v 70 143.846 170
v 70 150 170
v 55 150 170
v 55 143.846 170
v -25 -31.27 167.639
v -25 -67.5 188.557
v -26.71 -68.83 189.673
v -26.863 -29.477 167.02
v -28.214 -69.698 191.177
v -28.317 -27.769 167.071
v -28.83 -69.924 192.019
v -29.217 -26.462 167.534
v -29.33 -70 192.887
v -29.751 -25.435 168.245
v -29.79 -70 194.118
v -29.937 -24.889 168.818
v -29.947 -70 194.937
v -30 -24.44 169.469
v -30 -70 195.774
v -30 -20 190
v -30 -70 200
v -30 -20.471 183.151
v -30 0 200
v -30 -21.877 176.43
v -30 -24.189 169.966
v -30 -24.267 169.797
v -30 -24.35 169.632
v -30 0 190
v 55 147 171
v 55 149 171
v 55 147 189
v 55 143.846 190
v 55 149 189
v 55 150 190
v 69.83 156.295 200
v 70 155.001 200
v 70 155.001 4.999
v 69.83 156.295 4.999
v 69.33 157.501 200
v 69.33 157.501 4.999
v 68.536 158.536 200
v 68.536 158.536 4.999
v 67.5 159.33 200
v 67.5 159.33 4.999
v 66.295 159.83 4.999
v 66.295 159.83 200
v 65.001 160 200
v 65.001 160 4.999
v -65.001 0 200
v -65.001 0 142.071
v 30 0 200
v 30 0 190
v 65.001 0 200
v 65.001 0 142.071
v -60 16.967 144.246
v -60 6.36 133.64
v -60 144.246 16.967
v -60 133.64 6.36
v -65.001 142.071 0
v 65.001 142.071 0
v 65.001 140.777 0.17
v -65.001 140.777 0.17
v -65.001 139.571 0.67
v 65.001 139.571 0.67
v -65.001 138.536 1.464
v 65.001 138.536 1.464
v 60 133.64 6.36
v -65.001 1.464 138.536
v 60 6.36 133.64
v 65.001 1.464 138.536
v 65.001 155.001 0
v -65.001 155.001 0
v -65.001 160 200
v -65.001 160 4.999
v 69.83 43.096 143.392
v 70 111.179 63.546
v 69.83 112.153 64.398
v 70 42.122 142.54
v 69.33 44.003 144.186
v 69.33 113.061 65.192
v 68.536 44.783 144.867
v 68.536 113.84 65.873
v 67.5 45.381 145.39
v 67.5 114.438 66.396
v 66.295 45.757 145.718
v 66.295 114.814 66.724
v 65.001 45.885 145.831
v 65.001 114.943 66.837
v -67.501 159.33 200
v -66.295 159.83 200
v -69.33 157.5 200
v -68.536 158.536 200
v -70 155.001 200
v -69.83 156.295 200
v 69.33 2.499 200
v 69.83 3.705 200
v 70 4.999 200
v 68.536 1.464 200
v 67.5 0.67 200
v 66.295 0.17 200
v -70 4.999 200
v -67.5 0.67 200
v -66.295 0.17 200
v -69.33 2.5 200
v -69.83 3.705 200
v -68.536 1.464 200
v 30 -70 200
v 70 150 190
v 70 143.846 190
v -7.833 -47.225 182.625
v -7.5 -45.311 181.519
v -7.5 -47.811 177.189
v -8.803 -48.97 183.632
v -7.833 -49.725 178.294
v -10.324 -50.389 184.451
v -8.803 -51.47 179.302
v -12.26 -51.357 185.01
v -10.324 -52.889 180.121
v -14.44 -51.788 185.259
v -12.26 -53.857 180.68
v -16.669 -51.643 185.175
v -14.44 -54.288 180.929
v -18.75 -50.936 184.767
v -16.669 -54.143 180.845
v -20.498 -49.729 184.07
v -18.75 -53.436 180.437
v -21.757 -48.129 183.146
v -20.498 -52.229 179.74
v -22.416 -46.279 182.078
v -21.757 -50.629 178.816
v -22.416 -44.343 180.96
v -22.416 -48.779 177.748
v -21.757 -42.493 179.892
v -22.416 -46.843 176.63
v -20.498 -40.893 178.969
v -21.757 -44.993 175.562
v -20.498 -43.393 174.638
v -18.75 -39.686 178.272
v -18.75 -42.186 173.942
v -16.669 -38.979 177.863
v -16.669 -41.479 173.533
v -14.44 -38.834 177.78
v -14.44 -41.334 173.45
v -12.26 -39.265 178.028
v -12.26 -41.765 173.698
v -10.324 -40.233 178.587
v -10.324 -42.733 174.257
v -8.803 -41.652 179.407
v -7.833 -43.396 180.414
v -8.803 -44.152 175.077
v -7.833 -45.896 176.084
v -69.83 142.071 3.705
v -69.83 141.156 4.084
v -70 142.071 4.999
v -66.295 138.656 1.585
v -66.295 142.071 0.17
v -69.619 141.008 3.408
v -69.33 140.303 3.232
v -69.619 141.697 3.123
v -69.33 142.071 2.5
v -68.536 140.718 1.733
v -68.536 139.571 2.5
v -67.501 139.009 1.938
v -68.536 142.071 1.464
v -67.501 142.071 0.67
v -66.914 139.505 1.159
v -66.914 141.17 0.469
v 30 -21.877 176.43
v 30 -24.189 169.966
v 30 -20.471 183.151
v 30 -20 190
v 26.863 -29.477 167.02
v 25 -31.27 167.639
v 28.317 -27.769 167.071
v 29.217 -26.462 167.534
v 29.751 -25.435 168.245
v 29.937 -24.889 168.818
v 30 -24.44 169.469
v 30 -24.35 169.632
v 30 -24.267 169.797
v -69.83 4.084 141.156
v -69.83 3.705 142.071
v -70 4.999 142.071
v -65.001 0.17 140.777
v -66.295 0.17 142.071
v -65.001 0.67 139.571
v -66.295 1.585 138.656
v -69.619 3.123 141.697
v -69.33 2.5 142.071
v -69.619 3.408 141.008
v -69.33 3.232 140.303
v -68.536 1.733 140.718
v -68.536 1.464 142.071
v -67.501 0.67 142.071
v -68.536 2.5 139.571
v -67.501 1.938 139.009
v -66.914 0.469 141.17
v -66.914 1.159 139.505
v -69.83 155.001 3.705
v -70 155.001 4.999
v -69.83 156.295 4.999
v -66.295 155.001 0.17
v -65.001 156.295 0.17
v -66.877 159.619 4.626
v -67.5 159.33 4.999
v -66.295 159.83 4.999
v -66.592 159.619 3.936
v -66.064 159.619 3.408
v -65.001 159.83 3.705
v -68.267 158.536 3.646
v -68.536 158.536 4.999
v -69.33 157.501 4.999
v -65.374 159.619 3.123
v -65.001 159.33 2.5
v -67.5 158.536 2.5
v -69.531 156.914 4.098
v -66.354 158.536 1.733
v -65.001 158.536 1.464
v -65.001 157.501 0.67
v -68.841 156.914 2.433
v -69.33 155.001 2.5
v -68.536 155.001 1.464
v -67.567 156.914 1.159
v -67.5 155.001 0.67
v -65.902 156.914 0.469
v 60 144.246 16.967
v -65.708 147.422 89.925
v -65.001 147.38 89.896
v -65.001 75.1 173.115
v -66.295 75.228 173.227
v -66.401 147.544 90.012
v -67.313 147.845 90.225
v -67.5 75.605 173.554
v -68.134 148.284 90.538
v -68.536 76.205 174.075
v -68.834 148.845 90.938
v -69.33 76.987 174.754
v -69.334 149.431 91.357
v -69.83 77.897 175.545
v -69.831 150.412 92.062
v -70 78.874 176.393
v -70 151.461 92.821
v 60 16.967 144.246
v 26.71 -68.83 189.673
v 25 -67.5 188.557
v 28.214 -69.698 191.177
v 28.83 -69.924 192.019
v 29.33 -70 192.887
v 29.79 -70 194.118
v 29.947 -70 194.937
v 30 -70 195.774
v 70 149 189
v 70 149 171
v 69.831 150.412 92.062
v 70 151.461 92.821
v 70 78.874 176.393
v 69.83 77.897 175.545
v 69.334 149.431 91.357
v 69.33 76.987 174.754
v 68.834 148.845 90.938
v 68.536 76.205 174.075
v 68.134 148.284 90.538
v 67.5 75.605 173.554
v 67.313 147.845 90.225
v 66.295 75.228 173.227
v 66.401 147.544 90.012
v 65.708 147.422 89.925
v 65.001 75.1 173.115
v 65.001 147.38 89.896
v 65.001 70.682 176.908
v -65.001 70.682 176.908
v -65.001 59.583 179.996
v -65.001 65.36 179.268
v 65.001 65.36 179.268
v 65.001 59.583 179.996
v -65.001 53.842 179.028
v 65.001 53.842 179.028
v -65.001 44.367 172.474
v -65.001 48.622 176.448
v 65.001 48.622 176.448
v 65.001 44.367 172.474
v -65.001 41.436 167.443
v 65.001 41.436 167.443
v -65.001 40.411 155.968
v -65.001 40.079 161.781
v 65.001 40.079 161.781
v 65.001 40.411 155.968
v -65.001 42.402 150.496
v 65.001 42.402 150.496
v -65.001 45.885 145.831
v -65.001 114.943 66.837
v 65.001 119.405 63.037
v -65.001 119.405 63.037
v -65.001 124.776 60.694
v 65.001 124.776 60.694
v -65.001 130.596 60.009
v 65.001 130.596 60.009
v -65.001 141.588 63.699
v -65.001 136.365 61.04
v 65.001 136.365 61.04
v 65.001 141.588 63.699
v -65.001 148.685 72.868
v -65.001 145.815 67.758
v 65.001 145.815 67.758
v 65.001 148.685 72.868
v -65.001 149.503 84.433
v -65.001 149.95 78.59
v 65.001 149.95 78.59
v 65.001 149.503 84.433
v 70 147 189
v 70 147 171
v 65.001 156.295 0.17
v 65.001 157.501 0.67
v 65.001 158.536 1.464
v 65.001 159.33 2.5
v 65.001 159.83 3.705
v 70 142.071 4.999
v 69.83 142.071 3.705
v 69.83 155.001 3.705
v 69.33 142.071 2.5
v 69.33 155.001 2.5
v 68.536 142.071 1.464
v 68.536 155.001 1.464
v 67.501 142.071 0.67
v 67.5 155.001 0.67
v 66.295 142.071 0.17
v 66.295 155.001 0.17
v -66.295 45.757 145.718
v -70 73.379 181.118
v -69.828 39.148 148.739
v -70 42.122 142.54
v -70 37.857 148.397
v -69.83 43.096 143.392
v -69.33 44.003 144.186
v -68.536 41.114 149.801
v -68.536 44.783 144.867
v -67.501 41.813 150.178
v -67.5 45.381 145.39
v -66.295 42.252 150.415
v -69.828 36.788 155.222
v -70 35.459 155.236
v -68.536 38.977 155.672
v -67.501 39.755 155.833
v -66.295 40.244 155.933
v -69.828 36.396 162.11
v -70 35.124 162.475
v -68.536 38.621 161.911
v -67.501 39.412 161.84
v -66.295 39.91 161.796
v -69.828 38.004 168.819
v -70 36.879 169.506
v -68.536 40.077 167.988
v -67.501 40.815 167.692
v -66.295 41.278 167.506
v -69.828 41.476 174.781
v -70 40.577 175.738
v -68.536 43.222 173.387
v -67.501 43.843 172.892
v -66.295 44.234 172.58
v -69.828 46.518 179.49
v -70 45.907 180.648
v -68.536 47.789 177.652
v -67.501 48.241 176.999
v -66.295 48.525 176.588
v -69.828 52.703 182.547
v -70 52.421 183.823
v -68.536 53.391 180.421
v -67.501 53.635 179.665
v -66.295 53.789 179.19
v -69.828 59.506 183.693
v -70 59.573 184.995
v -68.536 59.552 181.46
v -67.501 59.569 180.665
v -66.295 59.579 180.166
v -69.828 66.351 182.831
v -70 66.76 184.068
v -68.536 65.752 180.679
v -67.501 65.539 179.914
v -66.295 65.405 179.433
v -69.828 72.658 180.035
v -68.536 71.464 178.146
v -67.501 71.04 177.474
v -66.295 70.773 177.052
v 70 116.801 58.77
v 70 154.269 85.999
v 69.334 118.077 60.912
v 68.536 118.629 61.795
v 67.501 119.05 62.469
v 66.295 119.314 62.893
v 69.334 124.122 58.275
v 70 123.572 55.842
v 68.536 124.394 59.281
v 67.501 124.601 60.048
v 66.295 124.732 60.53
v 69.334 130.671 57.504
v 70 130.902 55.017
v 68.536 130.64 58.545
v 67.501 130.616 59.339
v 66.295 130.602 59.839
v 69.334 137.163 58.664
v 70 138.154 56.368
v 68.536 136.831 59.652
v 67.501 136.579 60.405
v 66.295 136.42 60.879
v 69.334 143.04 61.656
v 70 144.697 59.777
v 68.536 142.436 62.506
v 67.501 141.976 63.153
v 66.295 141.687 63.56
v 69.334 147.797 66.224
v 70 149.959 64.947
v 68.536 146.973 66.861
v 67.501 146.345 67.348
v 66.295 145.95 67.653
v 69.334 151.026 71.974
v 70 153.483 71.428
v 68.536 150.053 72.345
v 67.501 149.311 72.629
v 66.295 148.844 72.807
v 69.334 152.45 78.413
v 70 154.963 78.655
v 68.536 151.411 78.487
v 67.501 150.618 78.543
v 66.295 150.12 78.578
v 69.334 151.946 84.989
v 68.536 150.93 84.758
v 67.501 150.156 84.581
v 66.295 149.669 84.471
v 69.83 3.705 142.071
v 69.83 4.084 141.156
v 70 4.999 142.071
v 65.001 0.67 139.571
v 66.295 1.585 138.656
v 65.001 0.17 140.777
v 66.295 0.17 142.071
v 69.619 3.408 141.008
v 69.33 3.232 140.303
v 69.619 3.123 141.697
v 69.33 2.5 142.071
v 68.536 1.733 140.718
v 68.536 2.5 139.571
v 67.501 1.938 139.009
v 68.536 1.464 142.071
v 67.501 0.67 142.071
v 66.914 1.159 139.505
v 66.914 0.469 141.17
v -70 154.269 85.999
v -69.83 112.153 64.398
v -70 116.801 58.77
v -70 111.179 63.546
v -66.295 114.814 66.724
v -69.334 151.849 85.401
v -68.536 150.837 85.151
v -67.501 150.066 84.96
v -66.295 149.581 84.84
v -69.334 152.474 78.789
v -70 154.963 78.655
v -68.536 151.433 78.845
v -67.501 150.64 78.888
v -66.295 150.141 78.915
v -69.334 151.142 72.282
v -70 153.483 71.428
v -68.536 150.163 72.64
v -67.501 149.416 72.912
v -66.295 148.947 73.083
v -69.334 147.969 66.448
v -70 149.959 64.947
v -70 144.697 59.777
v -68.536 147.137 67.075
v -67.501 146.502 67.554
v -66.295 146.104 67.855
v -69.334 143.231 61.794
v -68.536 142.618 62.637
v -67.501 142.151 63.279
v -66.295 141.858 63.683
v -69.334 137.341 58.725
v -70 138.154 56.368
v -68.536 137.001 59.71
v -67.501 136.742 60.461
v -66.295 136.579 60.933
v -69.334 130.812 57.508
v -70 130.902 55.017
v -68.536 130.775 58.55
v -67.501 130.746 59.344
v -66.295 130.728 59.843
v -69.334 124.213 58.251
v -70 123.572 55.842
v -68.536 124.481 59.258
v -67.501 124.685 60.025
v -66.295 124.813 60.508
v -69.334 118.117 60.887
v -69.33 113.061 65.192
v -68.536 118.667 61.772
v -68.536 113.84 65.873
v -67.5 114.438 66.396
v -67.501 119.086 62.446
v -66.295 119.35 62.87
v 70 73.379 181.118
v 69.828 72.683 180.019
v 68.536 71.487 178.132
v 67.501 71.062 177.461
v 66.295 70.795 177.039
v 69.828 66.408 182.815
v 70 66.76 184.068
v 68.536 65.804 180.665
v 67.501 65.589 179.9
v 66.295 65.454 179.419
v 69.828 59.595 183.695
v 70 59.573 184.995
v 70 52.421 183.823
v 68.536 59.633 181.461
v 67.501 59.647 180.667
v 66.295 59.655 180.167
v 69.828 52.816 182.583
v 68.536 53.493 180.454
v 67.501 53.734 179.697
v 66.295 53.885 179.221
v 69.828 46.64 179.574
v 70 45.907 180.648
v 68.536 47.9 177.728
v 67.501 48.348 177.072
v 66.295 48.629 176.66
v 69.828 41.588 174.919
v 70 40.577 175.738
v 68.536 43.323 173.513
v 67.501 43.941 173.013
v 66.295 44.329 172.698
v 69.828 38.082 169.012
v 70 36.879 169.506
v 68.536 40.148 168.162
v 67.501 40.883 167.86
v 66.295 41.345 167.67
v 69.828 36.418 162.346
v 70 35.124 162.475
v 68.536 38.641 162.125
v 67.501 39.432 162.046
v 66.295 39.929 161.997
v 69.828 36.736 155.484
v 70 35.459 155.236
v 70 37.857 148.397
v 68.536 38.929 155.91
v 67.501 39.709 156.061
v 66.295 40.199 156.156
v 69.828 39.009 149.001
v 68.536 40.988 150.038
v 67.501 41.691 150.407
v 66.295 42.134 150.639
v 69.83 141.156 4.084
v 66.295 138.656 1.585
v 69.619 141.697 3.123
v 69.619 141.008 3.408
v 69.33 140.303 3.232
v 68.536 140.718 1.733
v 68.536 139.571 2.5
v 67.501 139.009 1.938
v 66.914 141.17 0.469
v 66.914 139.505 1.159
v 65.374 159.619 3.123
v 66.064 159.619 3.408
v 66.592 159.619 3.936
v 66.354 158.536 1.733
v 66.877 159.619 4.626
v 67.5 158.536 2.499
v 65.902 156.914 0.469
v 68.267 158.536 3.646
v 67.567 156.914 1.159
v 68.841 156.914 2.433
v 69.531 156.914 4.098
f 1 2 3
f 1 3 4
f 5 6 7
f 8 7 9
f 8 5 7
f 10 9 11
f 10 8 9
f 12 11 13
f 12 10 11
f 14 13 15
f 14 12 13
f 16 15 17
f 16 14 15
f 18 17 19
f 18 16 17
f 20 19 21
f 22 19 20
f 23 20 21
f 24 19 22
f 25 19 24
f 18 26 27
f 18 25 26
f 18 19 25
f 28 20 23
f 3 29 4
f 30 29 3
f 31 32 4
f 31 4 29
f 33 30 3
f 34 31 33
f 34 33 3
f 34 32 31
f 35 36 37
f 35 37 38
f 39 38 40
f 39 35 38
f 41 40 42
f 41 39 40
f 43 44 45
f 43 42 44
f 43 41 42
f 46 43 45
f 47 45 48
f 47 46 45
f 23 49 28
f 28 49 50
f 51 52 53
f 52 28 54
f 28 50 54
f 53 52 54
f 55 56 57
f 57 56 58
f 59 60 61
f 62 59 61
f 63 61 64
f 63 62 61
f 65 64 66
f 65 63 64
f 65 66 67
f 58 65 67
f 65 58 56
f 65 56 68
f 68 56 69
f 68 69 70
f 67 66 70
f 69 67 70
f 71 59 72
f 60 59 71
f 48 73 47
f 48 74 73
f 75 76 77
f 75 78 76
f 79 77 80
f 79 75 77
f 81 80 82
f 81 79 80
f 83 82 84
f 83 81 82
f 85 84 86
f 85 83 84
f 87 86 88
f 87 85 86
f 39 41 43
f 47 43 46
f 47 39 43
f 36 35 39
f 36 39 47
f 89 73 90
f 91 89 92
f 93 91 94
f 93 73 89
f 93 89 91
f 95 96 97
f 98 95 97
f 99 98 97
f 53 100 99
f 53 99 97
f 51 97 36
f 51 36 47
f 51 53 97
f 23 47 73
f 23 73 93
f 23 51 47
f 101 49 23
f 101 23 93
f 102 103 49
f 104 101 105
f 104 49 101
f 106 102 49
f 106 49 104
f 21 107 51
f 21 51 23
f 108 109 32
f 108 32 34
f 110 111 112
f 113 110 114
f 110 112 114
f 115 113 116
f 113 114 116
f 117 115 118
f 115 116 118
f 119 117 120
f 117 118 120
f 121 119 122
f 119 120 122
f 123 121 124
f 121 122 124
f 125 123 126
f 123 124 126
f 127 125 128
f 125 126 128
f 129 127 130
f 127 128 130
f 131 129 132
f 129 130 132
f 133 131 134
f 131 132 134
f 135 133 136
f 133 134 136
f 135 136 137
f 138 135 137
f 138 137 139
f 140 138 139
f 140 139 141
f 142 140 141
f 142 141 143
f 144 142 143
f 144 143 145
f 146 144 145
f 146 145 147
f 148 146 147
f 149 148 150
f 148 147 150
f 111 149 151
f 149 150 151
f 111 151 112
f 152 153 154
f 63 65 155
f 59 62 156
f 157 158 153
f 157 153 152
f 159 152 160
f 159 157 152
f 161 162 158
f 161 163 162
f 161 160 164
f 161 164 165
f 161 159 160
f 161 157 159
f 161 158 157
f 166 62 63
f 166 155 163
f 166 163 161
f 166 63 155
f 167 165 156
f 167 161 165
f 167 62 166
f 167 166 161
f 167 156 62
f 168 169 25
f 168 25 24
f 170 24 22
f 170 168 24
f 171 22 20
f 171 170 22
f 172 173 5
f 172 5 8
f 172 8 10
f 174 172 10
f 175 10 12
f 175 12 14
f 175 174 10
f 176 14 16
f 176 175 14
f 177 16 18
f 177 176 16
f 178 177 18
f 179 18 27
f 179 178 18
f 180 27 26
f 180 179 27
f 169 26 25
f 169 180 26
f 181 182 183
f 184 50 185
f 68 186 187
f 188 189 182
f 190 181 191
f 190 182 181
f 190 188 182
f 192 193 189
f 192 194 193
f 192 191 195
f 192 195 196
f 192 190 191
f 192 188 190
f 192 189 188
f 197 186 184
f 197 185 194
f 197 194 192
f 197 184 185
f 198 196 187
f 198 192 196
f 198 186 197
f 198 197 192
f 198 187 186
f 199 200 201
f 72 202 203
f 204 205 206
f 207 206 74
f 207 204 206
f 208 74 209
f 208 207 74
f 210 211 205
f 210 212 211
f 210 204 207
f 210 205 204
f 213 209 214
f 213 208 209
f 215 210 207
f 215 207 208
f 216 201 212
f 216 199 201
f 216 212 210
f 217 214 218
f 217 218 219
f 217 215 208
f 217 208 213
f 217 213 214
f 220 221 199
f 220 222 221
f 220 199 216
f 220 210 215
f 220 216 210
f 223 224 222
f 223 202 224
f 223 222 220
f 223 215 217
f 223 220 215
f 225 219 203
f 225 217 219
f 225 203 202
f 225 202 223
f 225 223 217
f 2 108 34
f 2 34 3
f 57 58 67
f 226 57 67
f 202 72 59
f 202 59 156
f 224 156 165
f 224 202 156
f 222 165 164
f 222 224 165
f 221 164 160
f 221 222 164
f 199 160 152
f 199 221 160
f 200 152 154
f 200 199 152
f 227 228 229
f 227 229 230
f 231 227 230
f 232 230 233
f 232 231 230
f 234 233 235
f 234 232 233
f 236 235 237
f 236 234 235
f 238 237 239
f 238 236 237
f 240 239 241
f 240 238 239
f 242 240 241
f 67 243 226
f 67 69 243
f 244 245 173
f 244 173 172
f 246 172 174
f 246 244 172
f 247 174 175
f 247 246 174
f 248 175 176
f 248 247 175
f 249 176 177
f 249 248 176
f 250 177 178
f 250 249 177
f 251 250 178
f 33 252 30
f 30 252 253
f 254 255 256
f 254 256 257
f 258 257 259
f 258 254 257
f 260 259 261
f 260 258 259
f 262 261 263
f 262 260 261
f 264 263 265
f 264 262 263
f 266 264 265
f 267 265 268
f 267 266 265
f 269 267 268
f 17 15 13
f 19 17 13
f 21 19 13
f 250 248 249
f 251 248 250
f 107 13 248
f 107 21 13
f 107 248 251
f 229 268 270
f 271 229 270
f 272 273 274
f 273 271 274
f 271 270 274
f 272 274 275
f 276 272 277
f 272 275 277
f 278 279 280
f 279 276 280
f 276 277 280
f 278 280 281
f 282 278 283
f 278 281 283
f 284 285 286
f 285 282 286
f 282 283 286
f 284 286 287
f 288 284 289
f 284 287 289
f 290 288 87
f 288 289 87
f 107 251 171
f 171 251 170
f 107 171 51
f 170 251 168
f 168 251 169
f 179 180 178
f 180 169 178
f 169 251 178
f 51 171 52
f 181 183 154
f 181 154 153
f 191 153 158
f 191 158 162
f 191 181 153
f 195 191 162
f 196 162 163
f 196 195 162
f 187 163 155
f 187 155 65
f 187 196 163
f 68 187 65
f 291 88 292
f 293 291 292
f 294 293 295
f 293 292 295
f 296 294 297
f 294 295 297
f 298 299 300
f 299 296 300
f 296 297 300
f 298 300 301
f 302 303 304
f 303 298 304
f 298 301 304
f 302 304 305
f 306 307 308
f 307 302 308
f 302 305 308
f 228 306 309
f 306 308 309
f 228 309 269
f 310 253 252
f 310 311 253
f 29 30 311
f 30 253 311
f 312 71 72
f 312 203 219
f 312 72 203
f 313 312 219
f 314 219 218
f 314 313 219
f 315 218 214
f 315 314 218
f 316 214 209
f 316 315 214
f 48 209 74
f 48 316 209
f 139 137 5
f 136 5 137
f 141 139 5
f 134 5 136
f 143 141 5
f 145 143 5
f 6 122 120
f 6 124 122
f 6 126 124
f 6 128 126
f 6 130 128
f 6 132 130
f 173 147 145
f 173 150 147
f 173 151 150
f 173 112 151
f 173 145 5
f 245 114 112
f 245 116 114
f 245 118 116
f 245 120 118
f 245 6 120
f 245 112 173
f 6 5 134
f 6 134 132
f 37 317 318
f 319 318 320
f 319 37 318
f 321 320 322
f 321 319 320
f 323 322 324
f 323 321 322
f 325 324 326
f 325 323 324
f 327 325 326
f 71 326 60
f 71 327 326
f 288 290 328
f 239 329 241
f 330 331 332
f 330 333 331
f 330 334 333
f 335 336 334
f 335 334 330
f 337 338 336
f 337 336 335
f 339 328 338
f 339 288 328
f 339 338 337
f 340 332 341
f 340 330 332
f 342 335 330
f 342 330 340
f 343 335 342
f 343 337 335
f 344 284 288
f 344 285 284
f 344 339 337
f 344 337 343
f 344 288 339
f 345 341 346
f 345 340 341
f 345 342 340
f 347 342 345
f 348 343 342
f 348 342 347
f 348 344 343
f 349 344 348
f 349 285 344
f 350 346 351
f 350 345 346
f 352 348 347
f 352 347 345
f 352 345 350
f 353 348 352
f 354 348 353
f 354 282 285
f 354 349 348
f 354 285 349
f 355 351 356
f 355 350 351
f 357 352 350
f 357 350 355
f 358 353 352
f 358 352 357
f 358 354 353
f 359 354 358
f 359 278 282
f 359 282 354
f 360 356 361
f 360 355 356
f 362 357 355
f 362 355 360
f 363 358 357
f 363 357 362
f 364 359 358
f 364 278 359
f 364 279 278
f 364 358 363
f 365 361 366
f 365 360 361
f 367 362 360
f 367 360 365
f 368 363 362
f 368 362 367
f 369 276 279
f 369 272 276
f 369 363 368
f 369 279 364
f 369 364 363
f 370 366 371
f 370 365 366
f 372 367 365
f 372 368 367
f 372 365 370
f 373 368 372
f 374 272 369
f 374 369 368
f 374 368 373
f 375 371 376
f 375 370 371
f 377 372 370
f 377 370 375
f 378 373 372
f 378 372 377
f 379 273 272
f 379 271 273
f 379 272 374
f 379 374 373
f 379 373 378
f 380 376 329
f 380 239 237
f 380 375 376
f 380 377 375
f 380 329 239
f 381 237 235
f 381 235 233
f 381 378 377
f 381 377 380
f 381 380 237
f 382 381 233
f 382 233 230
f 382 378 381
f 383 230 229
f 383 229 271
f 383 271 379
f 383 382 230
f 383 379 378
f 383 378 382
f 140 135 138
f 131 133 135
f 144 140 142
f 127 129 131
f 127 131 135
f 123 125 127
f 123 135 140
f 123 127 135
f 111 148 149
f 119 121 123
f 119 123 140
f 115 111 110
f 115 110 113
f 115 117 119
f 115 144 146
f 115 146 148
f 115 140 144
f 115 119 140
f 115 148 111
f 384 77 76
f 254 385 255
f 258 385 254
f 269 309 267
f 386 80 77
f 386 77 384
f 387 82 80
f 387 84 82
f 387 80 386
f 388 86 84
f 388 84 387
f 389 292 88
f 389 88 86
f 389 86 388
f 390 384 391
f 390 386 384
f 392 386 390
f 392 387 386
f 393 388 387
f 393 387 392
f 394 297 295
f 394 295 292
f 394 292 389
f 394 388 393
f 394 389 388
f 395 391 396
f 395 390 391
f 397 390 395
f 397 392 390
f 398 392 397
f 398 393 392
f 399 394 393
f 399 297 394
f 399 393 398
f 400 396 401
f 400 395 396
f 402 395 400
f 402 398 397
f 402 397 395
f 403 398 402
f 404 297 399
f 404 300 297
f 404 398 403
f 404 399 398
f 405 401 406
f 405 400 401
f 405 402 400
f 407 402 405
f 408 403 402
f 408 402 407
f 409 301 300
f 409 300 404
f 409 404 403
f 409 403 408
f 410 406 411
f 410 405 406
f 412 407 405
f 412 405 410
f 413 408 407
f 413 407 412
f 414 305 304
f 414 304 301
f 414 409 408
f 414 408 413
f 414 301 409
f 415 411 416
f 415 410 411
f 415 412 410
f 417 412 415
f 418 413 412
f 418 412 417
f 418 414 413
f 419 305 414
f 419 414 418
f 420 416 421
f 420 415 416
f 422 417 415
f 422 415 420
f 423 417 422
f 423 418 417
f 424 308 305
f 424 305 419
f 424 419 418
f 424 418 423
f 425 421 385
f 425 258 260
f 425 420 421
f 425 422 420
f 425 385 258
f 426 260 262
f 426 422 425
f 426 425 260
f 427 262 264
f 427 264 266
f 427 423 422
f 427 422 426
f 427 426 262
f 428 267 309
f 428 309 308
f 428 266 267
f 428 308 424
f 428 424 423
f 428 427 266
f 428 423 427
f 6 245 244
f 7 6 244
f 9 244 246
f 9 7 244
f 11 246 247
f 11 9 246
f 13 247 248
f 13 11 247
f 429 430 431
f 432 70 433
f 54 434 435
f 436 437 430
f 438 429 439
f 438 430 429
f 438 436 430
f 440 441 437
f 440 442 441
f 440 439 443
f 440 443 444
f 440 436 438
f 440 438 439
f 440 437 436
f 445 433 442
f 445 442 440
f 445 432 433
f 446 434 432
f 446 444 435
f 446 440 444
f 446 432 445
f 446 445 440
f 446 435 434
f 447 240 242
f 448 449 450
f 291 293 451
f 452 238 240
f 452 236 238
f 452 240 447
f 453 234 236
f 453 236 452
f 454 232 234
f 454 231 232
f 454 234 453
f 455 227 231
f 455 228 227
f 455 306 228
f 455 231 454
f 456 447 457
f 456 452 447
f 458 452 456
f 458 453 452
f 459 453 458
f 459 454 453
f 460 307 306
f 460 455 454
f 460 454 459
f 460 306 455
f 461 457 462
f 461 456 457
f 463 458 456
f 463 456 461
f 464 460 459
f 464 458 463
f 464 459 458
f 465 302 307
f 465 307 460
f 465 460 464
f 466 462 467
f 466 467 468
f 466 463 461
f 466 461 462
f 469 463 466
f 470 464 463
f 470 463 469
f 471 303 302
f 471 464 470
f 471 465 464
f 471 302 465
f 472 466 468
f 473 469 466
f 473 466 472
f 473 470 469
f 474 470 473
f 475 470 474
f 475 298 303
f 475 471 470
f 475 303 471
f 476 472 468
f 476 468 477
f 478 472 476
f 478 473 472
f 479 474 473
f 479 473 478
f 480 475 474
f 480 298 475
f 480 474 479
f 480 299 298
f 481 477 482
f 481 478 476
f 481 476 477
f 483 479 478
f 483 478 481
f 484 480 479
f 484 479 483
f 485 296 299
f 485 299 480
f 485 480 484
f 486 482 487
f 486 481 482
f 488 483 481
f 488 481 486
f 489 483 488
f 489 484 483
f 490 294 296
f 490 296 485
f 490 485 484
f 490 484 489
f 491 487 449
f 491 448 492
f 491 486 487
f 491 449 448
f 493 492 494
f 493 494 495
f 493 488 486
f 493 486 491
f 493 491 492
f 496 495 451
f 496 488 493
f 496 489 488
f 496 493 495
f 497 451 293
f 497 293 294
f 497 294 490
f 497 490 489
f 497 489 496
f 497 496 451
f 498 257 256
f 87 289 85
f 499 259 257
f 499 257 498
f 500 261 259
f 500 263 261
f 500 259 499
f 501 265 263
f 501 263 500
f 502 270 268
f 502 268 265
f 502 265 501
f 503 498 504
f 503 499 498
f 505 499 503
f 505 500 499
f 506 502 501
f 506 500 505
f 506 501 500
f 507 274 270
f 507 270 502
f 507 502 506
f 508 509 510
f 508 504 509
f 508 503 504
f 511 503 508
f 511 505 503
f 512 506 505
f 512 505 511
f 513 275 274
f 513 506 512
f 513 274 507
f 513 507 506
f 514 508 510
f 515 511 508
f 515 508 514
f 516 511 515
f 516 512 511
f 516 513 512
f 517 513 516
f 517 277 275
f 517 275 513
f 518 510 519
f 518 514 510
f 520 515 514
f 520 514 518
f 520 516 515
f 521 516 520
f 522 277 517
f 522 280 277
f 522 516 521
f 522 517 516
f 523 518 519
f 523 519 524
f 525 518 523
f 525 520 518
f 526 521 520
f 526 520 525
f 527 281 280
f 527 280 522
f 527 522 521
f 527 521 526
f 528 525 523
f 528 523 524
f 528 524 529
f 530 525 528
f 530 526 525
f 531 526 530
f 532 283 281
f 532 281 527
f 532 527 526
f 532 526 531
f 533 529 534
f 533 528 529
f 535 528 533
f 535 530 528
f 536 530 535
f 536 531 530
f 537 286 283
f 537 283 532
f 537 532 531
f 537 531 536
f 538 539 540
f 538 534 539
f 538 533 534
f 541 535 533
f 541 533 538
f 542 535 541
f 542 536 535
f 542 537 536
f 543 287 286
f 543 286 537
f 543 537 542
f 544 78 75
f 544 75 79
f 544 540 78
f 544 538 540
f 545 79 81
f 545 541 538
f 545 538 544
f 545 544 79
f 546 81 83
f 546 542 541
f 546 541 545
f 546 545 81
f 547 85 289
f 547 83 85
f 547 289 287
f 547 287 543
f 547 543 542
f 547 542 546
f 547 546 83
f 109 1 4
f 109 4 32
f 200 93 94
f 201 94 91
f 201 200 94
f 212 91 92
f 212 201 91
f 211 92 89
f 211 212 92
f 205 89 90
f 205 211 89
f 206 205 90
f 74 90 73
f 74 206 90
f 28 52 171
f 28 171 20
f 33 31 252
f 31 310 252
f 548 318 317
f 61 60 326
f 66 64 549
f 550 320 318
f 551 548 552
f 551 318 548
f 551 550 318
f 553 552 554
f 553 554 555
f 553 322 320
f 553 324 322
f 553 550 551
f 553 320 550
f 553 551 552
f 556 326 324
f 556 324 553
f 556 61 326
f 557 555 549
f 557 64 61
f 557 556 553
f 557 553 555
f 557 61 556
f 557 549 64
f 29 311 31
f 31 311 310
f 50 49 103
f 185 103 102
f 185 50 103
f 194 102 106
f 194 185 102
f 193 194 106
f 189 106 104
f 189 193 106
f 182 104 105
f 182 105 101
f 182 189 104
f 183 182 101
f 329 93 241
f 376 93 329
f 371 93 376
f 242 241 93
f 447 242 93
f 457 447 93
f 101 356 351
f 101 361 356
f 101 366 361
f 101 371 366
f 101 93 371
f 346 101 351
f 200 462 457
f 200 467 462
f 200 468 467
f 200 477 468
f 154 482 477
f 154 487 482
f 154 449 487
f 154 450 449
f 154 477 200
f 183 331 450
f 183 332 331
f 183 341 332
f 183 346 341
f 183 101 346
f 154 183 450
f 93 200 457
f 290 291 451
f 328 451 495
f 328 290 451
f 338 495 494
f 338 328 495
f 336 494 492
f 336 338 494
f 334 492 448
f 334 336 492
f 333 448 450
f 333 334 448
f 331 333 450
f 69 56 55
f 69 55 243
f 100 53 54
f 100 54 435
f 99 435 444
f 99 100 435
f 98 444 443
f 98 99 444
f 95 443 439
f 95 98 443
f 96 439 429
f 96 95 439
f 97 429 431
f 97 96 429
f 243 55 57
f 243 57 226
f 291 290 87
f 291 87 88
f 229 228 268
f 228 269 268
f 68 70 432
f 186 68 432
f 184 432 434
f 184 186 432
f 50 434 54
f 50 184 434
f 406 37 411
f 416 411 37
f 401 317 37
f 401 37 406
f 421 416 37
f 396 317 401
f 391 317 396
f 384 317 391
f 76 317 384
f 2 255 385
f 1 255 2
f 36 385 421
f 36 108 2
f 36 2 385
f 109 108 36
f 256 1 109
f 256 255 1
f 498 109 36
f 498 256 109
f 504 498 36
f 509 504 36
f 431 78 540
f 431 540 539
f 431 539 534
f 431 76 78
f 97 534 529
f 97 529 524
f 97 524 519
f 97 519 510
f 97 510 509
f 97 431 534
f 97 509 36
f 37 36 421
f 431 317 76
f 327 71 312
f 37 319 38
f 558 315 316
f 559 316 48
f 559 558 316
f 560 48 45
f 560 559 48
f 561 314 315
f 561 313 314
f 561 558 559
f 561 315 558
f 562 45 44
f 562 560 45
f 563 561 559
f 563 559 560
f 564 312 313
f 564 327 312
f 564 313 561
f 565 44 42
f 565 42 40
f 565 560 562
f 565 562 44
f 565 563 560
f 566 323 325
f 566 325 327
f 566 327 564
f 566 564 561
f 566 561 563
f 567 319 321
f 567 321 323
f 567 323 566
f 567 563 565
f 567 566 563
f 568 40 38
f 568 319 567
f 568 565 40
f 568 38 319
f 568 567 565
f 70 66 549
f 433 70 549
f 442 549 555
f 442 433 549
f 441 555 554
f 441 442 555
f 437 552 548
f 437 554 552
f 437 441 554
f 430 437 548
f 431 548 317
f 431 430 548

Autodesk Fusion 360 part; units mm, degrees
sketch "Boceto1" plane through (0, 0, 0) normal (0, 1, 0) x (1, 0, 0)
  line L0 (0, -200) -> (70, -200)
  line L1 (0, -200) -> (-70, -200)
  line L2 (-70, -200) -> (-70, 0)
  line L3 (-70, 0) -> (70, 0)
  line L4 (70, 0) -> (70, -200)
  dimension "d1" = 200
  dimension "d2" = 70
  dimension "d3" = 70
extrude "Extruir1" add sketch "Boceto1" along normal blind 160
sketch "Boceto2" plane through (70, 0, 0) normal (1, 0, 0) x (0, 1, 0)
  line L0 (0, 200) -> (0, 0)
  line L1 (0, 0) -> (160, 0)
  line L2 (160, 0) -> (160, 200)
  line L3 (160, 200) -> (0, 200)
  line L4 (140, 0) -> (0, 140)
  line L5 (430, 170) -> (420, 170)
extrude "Extruir2" cut sketch "Boceto2" against normal blind 140 contours L0 L1 L4
sketch "Boceto3" plane through (0, 0, 0) normal (0, -1, 0) x (1, 0, 0)
  line L0 (-70, 140) -> (70, 140)
  line L1 (70, 140) -> (70, 200)
  line L2 (70, 200) -> (-70, 200)
  line L3 (-70, 200) -> (-70, 140)
  line L4 (30, 200) -> (30, 190)
  line L5 (30, 190) -> (-30, 190)
  line L6 (-30, 190) -> (-30, 200)
extrude "Extruir3" add sketch "Boceto3" along normal blind 70 contours L2 L4 L5 L6
sketch "Boceto4" plane through (0, 0, 190) normal (0, 0, -1) x (1, 0, 0)
  line L0 (-30, 0) -> (30, 0)
  line L1 (30, 0) -> (30, 70)
  line L2 (30, 70) -> (-30, 70)
  line L3 (-30, 70) -> (-30, 0)
  line L4 (-30, 20) -> (30, 20)
revolve "Revolución1" add sketch "Boceto4" angle 30 about axis through (30, -70, 190) along (-1, 0, 0) contours L1 L2 L3 L4
sketch "Boceto5" plane through (0, 64.7724, 112.1891) normal (0, -0.5, -0.866) x (1, 0, 0)
  line L0 (-30, 105.6218) -> (30, 105.6218)
  line L1 (30, 105.6218) -> (30, 155.6218)
  line L2 (30, 155.6218) -> (-30, 155.6218)
  line L3 (-30, 155.6218) -> (-30, 105.6218)
  circle A0 centre (-15, 130) radius 10
  circle A1 centre (-15, 130) radius 7.5
  dimension "d11" = 15
extrude "Extruir4" cut sketch "Boceto5" against normal blind 5 contours A1
sketch "Boceto6" plane through (0, 64.7724, 112.1891) normal (0, -0.5, -0.866) x (1, 0, 0)
  circle A0 centre (-15, 130) radius 7.5
  line L0 (-30, 105.6218) -> (30, 105.6218)
  line L1 (30, 105.6218) -> (30, 155.6218)
  line L2 (30, 155.6218) -> (-30, 155.6218)
  line L3 (-30, 155.6218) -> (-30, 105.6218)
  circle A1 centre (-15, 130) radius 10
  dimension "d14" = 20
sketch "Boceto7" plane through (70, 0, 0) normal (1, 0, 0) x (0, 1, 0)
  line L0 (0, 140) -> (140, 0)
  line L1 (140, 0) -> (160, 0)
  line L2 (160, 0) -> (160, 200)
  line L3 (160, 200) -> (0, 200)
  line L4 (0, 200) -> (0, 140)
  line L5 (0, 140) -> (0, 160)
  line L6 (0, 160) -> (160, 0)
  circle A0 centre (130, 80) radius 20
  circle A1 centre (60, 160) radius 20
  line L7 (45.8852, 145.8306) -> (114.9426, 66.8366)
  line L8 (147.3803, 89.8957) -> (75.0996, 173.1149)
  dimension "d15" = 20
extrude "Extruir5" cut sketch "Boceto7" against normal blind 170 contours A0 L8 | A0 A1 L7 L8 | A1 picked at (118.5803, 82.9284)
sketch "Boceto8" plane through (0, 70, 70) normal (0, -0.7071, -0.7071) x (1, 0, 0)
  line L0 (70, -98.9949) -> (70, 98.9949)
  line L1 (70, 98.9949) -> (-70, 98.9949)
  line L2 (-70, 98.9949) -> (-70, -98.9949)
  line L3 (-70, -98.9949) -> (70, -98.9949)
  line L4 (-60, 90) -> (60, 90)
  line L5 (60, 90) -> (60, -90)
  line L6 (-60, 90) -> (-60, -90)
  line L7 (-60, -90) -> (60, -90)
extrude "Extruir6" cut sketch "Boceto8" against normal blind 15 contours L4 L5 L6 L7
sketch "Boceto9" plane through (70, 0, 0) normal (1, 0, 0) x (0, 1, 0)
  arc A0 (75.0996, 173.1149) -> (45.8852, 145.8306) centre (60, 160) ccw
  line L0 (75.0996, 173.1149) -> (147.3803, 89.8957)
  arc A1 (114.9426, 66.8366) -> (147.3803, 89.8957) centre (130, 80) ccw
  line L1 (114.9426, 66.8366) -> (45.8852, 145.8306)
  line L2 (0, 140) -> (140, 0)
  line L3 (140, 0) -> (160, 0)
  line L4 (160, 0) -> (160, 200)
  line L5 (160, 200) -> (0, 200)
  line L6 (0, 200) -> (0, 140)
  line L7 (140, 190) -> (150, 190)
  line L8 (150, 190) -> (150, 170)
  line L9 (150, 170) -> (140, 170)
  line L10 (147, 171) -> (147, 189)
  line L11 (147, 189) -> (149, 189)
  line L12 (149, 189) -> (149, 171)
  line L13 (149, 171) -> (147, 171)
  line L14 (143.8463, 170) -> (143.8463, 190)
  dimension "d20" = 20
extrude "Extruir7" cut sketch "Boceto9" against normal blind 15 contours L7 L8 L9 L14
fillet "Empalme1" radius 5 19 edges at (70, 0, 170) (70, 70, 70) (70, 150, 0) (70, 160, 100) (-70, 0, 170) (-70, 70, 70) (-70, 150, 0) (-70, 160, 100) (-70, 80.4139, 106.3336) (-70, 141.5879, 63.6991) (-70, 111.24, 131.5053) (-70, 46.349, 174.6167) (70, 141.5879, 63.6991) (70, 80.4139, 106.3336) (70, 46.349, 174.6167) (70, 111.24, 131.5053) (0, 160, 0) (0, 140, 0) (0, 0, 140)
fillet "Empalme2" radius 5 4 edges at (30, -48.3494, 177.5) (0, -26.6987, 165) (-30, -48.3494, 177.5) (0, -70, 190)
